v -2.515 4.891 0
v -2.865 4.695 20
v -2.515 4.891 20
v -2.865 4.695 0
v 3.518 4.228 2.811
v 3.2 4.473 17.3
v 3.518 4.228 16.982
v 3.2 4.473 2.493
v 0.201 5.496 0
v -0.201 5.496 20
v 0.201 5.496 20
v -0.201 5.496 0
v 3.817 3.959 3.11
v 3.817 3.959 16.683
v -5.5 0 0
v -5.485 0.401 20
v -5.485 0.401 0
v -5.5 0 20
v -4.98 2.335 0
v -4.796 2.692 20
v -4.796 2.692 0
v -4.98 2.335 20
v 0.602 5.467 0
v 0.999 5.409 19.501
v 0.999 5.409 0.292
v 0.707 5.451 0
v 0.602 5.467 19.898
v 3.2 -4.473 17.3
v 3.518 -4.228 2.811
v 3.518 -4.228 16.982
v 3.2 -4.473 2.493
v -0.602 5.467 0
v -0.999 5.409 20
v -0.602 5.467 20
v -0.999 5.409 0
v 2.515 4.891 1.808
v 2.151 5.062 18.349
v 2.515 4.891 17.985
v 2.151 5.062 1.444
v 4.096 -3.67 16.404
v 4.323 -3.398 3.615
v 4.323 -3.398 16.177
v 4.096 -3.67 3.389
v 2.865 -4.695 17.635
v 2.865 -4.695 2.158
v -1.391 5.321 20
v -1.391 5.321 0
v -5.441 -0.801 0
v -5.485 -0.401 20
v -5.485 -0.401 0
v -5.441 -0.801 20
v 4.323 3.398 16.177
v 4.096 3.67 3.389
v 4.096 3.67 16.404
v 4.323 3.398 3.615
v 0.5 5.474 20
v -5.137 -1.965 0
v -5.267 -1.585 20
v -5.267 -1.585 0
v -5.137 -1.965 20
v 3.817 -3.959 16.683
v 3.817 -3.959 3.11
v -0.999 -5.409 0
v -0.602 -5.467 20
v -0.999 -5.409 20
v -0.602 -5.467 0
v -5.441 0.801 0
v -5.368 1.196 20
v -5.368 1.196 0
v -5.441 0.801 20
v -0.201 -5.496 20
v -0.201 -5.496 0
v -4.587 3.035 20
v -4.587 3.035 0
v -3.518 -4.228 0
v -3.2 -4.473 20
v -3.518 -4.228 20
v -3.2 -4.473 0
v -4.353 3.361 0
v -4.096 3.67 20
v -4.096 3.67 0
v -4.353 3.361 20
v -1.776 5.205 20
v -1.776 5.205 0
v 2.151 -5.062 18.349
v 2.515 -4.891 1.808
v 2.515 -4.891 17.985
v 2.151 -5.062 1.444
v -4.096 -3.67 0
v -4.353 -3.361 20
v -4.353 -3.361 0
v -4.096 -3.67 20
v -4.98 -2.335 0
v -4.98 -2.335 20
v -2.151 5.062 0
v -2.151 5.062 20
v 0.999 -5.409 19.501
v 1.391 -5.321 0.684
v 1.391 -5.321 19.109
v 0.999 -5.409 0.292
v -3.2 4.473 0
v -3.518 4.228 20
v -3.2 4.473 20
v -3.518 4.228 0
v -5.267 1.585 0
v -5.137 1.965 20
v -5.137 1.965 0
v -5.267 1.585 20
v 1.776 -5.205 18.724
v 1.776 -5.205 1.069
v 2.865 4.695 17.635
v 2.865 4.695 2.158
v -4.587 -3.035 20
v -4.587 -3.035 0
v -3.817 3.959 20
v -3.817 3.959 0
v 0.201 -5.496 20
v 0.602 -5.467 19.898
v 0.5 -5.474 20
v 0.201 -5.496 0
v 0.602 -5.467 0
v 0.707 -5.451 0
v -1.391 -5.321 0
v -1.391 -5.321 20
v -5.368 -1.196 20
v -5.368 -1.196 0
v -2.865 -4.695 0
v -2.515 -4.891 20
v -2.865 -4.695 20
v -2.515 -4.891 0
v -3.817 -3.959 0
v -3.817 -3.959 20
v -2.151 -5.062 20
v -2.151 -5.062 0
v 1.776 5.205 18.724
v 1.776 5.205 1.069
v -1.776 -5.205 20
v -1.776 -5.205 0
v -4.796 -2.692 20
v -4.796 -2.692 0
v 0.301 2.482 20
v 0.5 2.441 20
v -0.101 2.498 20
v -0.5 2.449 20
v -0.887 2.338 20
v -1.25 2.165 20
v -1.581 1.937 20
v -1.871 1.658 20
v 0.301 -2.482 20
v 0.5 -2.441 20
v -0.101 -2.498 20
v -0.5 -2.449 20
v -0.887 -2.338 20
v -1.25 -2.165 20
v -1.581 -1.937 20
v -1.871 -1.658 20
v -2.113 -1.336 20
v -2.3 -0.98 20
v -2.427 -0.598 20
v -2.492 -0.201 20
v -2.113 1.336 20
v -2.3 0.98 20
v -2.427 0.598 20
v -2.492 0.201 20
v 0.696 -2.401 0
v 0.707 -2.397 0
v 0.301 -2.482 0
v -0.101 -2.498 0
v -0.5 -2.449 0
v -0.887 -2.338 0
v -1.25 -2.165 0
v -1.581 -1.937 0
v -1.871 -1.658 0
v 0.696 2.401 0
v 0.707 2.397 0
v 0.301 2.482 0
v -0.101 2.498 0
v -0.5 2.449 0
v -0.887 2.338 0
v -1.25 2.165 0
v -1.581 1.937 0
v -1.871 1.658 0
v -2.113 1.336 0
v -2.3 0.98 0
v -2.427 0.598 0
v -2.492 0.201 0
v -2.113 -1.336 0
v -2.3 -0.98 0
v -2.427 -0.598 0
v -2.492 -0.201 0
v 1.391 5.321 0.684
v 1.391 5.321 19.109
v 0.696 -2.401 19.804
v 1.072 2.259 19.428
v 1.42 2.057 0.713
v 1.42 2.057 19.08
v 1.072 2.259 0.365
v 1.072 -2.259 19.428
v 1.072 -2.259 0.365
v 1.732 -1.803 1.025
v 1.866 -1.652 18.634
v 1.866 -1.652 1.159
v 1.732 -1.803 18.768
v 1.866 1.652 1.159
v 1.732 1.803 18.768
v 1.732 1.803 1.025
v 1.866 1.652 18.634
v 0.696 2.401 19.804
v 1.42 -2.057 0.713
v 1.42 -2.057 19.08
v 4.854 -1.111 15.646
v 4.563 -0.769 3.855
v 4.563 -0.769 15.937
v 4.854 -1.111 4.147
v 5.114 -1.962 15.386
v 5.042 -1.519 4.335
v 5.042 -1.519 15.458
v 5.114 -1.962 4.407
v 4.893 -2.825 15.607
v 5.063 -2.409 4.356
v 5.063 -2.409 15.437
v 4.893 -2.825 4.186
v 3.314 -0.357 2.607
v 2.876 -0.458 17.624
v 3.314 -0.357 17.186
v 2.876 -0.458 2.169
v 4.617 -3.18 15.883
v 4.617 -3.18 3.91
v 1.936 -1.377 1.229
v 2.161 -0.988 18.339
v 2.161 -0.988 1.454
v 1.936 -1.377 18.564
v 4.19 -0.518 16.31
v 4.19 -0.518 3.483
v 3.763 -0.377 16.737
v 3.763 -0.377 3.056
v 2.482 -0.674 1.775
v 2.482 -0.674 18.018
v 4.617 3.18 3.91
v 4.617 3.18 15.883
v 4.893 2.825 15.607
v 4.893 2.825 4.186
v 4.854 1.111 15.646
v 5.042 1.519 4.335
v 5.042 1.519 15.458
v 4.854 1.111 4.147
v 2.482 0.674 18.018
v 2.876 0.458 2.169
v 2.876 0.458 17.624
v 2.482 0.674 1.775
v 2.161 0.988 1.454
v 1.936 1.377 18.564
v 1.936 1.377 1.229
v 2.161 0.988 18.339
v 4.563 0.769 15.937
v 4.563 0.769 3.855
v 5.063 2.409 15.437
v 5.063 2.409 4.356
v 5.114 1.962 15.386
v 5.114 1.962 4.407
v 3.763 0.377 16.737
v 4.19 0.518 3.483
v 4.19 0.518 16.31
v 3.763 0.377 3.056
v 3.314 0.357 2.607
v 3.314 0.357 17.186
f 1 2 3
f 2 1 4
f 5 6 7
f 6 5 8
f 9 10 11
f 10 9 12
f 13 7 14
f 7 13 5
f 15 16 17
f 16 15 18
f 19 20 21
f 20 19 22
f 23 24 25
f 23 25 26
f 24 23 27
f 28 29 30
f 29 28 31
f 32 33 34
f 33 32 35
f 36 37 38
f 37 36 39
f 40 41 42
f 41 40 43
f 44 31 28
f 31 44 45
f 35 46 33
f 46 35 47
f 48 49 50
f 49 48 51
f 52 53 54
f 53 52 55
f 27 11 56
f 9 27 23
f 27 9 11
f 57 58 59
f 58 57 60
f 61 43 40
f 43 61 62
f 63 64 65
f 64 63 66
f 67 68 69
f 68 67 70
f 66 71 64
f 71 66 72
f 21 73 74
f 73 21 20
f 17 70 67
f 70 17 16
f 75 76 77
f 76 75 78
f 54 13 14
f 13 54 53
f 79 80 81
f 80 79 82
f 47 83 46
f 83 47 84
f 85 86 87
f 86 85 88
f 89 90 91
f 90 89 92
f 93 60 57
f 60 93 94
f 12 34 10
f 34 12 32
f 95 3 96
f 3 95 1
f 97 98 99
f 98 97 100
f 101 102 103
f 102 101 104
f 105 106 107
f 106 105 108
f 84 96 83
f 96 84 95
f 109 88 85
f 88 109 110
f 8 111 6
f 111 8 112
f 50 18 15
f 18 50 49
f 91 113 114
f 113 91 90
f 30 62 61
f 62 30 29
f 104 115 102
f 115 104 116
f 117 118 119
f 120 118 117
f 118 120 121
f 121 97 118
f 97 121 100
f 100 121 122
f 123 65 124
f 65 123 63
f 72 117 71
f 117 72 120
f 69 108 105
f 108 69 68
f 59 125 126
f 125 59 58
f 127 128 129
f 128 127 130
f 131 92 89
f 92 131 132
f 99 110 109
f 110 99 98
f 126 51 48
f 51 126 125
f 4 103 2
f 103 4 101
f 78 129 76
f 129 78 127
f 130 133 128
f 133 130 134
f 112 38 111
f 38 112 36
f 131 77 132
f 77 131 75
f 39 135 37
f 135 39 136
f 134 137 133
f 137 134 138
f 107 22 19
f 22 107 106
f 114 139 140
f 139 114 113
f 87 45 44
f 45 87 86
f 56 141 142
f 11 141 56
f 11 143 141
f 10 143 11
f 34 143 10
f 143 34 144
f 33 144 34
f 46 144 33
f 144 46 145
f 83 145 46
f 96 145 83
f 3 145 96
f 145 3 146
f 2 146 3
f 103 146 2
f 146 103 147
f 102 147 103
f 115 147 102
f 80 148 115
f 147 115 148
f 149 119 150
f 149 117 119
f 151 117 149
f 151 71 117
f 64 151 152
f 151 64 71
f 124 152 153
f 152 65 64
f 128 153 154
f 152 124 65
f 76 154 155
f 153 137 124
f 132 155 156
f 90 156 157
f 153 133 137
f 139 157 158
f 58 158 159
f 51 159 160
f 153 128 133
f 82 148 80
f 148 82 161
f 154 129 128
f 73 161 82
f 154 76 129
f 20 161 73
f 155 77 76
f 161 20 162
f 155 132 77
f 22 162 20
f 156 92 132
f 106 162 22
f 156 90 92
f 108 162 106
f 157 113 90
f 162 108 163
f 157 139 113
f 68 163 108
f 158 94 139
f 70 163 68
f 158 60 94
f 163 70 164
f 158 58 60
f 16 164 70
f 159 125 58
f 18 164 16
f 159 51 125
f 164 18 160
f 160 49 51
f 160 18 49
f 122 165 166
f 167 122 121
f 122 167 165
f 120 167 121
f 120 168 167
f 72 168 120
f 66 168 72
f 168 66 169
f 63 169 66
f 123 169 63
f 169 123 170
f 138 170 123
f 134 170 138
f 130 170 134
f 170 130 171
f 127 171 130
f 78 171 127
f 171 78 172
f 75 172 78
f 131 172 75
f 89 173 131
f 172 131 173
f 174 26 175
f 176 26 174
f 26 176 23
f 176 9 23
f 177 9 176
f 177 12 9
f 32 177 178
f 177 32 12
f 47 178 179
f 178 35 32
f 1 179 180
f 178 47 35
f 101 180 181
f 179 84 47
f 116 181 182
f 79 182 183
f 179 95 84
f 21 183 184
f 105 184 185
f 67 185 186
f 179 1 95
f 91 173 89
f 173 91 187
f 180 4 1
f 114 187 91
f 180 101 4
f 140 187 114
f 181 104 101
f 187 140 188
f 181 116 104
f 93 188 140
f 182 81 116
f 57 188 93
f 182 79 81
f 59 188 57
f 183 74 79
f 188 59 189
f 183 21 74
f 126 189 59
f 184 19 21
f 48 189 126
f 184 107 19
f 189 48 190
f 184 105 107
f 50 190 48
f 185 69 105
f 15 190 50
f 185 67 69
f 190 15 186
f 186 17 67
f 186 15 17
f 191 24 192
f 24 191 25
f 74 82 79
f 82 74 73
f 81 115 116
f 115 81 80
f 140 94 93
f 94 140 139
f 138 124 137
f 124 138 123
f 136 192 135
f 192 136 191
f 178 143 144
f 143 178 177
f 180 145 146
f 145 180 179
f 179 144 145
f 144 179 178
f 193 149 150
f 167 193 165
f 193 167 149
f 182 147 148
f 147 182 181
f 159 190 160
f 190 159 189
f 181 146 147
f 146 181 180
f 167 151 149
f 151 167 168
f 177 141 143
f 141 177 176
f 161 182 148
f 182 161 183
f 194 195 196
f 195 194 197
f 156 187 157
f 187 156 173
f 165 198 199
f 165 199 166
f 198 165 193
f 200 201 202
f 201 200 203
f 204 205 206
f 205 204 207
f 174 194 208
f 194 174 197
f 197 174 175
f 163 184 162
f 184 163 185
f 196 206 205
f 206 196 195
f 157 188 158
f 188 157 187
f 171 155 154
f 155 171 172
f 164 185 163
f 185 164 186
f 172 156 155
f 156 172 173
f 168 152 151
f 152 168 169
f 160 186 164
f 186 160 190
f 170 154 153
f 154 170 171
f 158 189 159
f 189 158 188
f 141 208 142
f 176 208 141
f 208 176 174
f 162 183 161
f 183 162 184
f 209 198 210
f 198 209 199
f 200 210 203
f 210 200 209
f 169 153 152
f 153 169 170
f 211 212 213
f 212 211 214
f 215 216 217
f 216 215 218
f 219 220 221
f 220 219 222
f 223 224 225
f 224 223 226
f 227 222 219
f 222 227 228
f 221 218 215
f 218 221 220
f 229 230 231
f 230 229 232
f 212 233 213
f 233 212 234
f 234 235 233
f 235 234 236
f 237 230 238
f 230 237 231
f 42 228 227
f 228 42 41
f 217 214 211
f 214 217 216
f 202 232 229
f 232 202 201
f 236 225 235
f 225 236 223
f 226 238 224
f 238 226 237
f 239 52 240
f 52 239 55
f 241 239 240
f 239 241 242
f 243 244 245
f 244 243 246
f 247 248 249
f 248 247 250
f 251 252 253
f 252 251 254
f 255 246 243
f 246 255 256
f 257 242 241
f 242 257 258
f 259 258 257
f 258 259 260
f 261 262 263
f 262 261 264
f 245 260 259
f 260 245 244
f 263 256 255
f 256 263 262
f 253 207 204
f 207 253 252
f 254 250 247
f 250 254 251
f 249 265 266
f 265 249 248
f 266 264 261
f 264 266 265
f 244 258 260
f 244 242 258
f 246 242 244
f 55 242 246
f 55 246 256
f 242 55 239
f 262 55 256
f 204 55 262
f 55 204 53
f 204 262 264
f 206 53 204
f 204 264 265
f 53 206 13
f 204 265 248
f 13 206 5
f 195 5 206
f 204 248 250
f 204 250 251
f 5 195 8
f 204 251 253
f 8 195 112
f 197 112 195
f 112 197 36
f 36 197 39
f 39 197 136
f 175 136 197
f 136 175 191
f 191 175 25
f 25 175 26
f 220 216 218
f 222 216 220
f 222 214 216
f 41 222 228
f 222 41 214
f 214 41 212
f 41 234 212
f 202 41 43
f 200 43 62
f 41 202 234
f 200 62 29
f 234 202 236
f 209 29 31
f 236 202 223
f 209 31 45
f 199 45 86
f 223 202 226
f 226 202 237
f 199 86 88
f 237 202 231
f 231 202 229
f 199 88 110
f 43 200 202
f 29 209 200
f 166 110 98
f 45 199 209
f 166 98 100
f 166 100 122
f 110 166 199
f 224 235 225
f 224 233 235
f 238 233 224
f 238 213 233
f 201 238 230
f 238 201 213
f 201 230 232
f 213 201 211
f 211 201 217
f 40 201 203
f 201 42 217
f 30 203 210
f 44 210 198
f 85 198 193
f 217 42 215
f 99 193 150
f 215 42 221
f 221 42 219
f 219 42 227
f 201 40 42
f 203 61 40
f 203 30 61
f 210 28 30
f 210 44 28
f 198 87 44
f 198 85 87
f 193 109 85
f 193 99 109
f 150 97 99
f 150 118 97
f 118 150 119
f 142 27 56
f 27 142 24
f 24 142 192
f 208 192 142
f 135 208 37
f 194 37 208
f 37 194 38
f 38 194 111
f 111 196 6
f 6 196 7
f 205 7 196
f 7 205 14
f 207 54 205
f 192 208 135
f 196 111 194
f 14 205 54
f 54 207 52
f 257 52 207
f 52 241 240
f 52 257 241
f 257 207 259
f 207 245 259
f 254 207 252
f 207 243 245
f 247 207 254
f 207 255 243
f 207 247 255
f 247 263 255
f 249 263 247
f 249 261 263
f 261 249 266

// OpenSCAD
clipInnerDiam = 5;
clipThikness = 3;
clipHeight = 20;
clipPercentOverlap = 10;
clipAngle = 60;
bevelAngle = 45;

module clip(id=clipInnerDiam,t=clipThikness,h=clipHeight){

	difference(){
		cylinder(r=id/2+t,h=h,$fn=PI*(id/2+t)*5);
		translate([0,0,-.5])
		cylinder(r=id/2,h=h+1,$fn=PI*id/2*5);
	}
}

module pie(radius, angle, height, spin=0) {
    // Negative angles shift direction of rotation
    clockwise = (angle < 0) ? true : false;
    // Support angles < 0 and > 360
    normalized_angle = abs((angle % 360 != 0) ? angle % 360 : angle % 360 + 360);
    // Select rotation direction
    rotation = clockwise ? [0, 180 - normalized_angle] : [180, normalized_angle];
    // Render
    if (angle != 0) {
        rotate([0,0,spin]) linear_extrude(height=height)
            difference() {
                circle(radius);
                if (normalized_angle < 180) {
                    union() for(a = rotation)
                        rotate(a) translate([-radius, 0, 0]) square(radius * 2);
                }
                else if (normalized_angle != 360) {
                    intersection_for(a = rotation)
                        rotate(a) translate([-radius, 0, 0]) square(radius * 2);
                }
            }
    }
}

difference() {
    union() {
        difference() {
            clip();
            translate([0,0,-.5])
            pie(clipInnerDiam+clipThikness, clipAngle, clipHeight+1, -clipAngle/2);
        }

        for (r=[-clipAngle/2,clipAngle/2]) rotate([0,0,r])
            translate([clipInnerDiam/2+clipThikness/2,0,0])
            cylinder(r=clipThikness/2*(1+clipPercentOverlap/100),h=clipHeight,$fn=PI*clipThikness/2*5);
    }

    rotate([0,-bevelAngle,0])
    translate([0,-clipInnerDiam-clipThikness,-clipHeight-0.5])
    cube([(clipInnerDiam+clipThikness)*2, (clipInnerDiam+clipThikness)*2, clipHeight]);
    
    translate([0,-clipInnerDiam-clipThikness,clipHeight+0.5])
    rotate([0,bevelAngle,0])
    cube([(clipInnerDiam+clipThikness)*2, (clipInnerDiam+clipThikness)*2, clipHeight]);
}
